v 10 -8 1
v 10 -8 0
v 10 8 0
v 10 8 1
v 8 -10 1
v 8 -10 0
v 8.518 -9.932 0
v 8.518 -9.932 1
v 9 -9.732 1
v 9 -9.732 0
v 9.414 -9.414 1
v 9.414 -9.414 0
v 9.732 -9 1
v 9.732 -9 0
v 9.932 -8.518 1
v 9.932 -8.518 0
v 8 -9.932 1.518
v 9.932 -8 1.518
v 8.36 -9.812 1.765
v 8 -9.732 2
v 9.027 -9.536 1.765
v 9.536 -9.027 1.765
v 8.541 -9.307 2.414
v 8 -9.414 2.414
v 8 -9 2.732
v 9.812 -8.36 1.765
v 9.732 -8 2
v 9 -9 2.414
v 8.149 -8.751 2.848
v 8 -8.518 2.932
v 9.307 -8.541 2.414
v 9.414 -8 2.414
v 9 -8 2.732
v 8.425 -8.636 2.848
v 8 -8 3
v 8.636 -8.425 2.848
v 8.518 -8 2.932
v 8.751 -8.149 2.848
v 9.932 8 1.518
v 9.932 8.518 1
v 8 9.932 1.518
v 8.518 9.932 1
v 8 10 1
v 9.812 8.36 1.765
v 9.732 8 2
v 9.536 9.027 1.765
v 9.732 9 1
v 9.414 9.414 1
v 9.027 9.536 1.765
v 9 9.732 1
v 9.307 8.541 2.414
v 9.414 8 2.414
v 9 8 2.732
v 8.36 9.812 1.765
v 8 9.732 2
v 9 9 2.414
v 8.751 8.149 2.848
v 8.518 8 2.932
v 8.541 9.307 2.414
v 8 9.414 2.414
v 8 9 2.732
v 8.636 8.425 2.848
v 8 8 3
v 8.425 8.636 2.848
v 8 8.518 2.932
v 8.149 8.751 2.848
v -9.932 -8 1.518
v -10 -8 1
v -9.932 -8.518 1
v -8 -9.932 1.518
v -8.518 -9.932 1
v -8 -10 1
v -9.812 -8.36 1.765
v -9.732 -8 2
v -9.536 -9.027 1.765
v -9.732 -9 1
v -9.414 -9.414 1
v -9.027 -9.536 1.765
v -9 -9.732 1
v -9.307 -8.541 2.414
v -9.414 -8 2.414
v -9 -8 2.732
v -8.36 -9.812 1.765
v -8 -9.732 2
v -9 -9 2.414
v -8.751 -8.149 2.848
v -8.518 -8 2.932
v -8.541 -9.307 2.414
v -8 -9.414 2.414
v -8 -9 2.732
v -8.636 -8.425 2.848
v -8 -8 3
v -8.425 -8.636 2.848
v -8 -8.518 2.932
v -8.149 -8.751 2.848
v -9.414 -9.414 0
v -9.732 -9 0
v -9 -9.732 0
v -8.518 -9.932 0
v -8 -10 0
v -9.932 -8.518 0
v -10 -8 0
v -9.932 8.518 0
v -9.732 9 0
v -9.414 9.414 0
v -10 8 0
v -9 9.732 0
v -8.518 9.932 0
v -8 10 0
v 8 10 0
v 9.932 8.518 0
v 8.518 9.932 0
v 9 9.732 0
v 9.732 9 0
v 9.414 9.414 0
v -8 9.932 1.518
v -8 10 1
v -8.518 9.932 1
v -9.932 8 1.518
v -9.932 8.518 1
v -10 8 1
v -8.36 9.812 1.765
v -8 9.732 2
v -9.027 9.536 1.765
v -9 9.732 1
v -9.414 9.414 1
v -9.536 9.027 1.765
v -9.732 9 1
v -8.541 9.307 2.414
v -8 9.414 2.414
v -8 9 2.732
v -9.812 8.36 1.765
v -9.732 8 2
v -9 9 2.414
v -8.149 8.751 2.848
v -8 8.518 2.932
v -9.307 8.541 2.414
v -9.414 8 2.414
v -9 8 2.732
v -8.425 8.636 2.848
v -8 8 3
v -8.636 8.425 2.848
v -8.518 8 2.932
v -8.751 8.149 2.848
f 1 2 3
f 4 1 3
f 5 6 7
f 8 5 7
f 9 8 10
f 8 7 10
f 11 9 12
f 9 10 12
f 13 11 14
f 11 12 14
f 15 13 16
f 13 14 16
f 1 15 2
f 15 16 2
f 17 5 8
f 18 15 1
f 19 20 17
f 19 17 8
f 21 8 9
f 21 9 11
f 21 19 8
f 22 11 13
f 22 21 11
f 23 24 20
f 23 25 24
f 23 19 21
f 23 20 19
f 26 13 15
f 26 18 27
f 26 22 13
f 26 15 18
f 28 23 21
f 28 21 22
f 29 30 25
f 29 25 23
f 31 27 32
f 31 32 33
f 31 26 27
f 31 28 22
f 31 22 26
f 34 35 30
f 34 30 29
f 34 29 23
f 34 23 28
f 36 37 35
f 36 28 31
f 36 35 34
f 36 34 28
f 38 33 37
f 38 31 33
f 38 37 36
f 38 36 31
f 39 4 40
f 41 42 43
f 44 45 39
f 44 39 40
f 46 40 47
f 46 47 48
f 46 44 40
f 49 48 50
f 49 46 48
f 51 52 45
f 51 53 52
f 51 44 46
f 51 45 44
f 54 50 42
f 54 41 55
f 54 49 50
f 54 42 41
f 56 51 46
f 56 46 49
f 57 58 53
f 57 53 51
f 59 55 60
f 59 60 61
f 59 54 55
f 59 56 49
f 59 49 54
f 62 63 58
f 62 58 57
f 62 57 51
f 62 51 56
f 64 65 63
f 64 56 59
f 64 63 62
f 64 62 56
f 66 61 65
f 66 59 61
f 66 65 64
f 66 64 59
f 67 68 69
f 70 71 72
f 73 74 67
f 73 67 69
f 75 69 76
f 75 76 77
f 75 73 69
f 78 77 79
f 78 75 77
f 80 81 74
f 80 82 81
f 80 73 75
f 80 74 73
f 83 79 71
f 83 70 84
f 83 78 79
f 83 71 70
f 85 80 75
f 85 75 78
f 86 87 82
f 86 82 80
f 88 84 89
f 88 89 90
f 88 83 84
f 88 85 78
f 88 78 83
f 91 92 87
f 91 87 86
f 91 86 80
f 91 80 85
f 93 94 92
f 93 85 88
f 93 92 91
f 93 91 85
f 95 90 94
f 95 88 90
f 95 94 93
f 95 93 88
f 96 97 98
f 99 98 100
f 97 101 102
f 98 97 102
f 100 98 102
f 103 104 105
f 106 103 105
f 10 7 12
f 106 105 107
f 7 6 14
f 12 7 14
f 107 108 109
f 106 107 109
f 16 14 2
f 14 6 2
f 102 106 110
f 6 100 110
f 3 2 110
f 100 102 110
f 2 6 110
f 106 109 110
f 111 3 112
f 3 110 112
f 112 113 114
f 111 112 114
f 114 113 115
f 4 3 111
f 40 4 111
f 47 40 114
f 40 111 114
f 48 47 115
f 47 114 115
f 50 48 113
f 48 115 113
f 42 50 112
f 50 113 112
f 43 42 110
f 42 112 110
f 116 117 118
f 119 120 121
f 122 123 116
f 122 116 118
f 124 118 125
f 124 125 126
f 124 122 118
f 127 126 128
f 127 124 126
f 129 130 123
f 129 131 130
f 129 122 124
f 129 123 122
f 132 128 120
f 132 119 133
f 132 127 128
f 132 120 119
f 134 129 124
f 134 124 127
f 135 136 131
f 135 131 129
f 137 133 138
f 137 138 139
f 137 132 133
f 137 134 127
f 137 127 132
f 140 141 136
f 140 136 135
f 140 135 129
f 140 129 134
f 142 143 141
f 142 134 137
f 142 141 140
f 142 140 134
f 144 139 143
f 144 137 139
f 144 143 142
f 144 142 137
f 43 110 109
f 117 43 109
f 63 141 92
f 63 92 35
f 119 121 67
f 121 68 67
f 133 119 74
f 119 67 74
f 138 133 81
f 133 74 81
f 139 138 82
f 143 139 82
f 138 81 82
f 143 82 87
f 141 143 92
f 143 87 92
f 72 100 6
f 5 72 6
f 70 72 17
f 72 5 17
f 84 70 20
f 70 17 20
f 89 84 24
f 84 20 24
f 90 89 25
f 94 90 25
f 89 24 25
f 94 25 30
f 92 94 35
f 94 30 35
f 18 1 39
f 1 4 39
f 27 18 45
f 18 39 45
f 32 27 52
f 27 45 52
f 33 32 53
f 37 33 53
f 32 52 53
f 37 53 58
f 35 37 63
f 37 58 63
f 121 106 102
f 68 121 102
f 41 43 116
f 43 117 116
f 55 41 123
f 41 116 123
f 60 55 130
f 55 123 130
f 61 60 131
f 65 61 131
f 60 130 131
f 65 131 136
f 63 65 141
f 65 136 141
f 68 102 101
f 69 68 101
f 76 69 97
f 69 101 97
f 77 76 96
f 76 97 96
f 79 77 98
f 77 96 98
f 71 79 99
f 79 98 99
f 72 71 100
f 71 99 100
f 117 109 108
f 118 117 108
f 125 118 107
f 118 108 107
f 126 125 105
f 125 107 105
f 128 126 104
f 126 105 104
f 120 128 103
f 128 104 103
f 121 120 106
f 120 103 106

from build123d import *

# Parameters (mm, degrees)
F1_DEPTH = 3
F2_R     = 2


with BuildPart() as f1:
    # F0 (on Top) → F1 (new body)
    with BuildSketch(Plane.XY):
        with BuildLine():
            ThreePointArc((10, 8), (9.4142135624, 9.4142135624), (8, 10))
            Line((8, 10), (-8, 10))
            ThreePointArc((-8, 10), (-9.4142135624, 9.4142135624), (-10, 8))
            Line((-10, 8), (-10, -8))
            ThreePointArc((-10, -8), (-9.4142135624, -9.4142135624), (-8, -10))
            Line((-8, -10), (8, -10))
            ThreePointArc((8, -10), (9.4142135624, -9.4142135624), (10, -8))
            Line((10, -8), (10, 8))
        make_face()
    extrude(amount=F1_DEPTH)

    # F2
    f2_edges = [f1.edges().sort_by_distance(p)[0] for p in [
        (-9.414214, 9.414214, 3),
    ]]
    fillet(f2_edges, radius=F2_R)


solid = f1.part
